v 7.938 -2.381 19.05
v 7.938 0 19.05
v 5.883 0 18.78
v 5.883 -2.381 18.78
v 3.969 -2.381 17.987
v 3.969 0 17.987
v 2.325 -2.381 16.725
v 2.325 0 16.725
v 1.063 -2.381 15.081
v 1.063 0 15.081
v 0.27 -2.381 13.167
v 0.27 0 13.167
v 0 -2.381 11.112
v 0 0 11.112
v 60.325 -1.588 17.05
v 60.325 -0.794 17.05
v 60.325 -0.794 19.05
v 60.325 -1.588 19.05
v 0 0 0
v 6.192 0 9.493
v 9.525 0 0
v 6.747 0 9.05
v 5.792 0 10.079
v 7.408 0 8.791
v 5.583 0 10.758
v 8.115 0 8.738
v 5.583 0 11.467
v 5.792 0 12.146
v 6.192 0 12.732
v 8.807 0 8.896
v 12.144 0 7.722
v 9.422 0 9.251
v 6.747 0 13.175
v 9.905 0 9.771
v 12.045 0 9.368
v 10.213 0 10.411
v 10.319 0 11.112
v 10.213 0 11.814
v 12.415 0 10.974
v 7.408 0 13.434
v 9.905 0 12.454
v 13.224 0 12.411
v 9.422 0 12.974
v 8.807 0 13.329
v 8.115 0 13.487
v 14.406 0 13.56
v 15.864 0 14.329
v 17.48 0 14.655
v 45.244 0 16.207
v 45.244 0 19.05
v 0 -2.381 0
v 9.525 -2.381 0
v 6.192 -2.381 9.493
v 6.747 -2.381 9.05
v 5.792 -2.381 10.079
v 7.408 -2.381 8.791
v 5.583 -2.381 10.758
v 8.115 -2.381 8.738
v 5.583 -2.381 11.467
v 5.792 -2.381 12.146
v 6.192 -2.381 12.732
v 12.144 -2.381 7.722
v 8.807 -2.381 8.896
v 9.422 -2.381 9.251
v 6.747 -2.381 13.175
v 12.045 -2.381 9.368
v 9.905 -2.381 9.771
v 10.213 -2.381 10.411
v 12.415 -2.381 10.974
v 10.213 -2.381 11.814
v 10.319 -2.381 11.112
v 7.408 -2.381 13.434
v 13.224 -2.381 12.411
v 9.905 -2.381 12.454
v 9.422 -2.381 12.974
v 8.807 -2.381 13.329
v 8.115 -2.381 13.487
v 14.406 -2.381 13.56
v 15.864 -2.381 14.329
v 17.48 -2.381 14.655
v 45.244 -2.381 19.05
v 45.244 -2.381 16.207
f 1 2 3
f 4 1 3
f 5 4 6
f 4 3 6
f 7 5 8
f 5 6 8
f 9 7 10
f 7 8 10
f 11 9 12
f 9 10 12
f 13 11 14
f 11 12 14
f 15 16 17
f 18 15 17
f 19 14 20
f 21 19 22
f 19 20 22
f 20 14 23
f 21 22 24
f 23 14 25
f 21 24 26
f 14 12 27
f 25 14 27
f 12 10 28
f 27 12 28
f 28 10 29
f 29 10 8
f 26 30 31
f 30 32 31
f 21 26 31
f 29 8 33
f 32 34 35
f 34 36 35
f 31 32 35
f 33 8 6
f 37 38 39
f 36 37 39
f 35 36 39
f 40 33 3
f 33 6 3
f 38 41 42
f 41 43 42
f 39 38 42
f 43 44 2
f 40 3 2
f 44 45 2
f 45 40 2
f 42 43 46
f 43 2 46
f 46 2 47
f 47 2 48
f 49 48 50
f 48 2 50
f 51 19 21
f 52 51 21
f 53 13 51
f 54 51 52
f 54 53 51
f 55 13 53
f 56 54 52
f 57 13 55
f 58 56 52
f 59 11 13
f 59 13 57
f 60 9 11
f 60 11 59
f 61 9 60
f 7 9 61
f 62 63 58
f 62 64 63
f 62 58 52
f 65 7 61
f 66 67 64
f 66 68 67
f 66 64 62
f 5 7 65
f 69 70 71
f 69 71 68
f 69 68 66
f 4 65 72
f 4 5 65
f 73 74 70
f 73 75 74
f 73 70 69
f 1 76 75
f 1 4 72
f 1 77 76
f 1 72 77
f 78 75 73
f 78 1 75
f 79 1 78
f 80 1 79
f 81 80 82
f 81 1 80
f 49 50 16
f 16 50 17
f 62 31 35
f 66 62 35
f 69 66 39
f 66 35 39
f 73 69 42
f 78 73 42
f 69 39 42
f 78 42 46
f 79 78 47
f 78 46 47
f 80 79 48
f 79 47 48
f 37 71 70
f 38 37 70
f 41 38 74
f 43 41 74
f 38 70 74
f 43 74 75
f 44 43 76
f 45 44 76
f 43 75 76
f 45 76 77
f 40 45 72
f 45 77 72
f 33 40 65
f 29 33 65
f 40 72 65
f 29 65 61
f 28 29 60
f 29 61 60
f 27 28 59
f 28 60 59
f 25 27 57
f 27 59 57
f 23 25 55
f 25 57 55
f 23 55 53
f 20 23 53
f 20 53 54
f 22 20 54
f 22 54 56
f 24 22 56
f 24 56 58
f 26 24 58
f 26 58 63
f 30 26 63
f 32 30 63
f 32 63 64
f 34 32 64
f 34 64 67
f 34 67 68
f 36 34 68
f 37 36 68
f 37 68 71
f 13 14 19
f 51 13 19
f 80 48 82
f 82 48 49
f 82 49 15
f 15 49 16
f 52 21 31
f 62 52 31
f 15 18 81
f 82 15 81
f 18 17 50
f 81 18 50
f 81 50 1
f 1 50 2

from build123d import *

# Parameters (mm, degrees)
F1_DEPTH = 2.38125
F2_R     = 2.38125
F3_DEPTH = 25.4
F5_DEPTH = 25.4


with BuildPart() as f1:
    # F0 (on Front) → F1 (new body)
    with BuildSketch(Plane.XZ):
        with BuildLine():
            Line((60.325, 19.05), (7.9375, 19.05))
            ThreePointArc((7.9375, 19.05), (2.32484, 16.72516), (0, 11.1125))
            Line((0, 11.1125), (0, 0))
            Line((0, 0), (9.525, 0))
            Line((9.525, 0), (12.144122, 7.72185))
            ThreePointArc((12.144122, 7.72185), (13.224173, 12.410645), (17.480062, 14.655354))
            Line((17.480062, 14.655354), (60.325, 17.05))
            Line((60.325, 17.05), (60.325, 19.05))
        make_face()
    extrude(amount=F1_DEPTH)

    # F2 (on face) → F3 (cut)
    with BuildSketch(Plane.XZ.offset(2.38125)):
        with Locations((7.9375, 11.1125)):
            Circle(F2_R)
    extrude(amount=-F3_DEPTH, mode=Mode.SUBTRACT)

    # F4 (on face) → F5 (cut)
    with BuildSketch(Plane.XY.offset(19.05)):
        Polygon((60.325, 0), (45.24375, 0), (60.325, -0.79375), align=None)
        Polygon((60.325, -2.38125), (60.325, -1.5875), (45.24375, -2.38125), align=None)
    extrude(amount=-F5_DEPTH, mode=Mode.SUBTRACT)


solid = f1.part
